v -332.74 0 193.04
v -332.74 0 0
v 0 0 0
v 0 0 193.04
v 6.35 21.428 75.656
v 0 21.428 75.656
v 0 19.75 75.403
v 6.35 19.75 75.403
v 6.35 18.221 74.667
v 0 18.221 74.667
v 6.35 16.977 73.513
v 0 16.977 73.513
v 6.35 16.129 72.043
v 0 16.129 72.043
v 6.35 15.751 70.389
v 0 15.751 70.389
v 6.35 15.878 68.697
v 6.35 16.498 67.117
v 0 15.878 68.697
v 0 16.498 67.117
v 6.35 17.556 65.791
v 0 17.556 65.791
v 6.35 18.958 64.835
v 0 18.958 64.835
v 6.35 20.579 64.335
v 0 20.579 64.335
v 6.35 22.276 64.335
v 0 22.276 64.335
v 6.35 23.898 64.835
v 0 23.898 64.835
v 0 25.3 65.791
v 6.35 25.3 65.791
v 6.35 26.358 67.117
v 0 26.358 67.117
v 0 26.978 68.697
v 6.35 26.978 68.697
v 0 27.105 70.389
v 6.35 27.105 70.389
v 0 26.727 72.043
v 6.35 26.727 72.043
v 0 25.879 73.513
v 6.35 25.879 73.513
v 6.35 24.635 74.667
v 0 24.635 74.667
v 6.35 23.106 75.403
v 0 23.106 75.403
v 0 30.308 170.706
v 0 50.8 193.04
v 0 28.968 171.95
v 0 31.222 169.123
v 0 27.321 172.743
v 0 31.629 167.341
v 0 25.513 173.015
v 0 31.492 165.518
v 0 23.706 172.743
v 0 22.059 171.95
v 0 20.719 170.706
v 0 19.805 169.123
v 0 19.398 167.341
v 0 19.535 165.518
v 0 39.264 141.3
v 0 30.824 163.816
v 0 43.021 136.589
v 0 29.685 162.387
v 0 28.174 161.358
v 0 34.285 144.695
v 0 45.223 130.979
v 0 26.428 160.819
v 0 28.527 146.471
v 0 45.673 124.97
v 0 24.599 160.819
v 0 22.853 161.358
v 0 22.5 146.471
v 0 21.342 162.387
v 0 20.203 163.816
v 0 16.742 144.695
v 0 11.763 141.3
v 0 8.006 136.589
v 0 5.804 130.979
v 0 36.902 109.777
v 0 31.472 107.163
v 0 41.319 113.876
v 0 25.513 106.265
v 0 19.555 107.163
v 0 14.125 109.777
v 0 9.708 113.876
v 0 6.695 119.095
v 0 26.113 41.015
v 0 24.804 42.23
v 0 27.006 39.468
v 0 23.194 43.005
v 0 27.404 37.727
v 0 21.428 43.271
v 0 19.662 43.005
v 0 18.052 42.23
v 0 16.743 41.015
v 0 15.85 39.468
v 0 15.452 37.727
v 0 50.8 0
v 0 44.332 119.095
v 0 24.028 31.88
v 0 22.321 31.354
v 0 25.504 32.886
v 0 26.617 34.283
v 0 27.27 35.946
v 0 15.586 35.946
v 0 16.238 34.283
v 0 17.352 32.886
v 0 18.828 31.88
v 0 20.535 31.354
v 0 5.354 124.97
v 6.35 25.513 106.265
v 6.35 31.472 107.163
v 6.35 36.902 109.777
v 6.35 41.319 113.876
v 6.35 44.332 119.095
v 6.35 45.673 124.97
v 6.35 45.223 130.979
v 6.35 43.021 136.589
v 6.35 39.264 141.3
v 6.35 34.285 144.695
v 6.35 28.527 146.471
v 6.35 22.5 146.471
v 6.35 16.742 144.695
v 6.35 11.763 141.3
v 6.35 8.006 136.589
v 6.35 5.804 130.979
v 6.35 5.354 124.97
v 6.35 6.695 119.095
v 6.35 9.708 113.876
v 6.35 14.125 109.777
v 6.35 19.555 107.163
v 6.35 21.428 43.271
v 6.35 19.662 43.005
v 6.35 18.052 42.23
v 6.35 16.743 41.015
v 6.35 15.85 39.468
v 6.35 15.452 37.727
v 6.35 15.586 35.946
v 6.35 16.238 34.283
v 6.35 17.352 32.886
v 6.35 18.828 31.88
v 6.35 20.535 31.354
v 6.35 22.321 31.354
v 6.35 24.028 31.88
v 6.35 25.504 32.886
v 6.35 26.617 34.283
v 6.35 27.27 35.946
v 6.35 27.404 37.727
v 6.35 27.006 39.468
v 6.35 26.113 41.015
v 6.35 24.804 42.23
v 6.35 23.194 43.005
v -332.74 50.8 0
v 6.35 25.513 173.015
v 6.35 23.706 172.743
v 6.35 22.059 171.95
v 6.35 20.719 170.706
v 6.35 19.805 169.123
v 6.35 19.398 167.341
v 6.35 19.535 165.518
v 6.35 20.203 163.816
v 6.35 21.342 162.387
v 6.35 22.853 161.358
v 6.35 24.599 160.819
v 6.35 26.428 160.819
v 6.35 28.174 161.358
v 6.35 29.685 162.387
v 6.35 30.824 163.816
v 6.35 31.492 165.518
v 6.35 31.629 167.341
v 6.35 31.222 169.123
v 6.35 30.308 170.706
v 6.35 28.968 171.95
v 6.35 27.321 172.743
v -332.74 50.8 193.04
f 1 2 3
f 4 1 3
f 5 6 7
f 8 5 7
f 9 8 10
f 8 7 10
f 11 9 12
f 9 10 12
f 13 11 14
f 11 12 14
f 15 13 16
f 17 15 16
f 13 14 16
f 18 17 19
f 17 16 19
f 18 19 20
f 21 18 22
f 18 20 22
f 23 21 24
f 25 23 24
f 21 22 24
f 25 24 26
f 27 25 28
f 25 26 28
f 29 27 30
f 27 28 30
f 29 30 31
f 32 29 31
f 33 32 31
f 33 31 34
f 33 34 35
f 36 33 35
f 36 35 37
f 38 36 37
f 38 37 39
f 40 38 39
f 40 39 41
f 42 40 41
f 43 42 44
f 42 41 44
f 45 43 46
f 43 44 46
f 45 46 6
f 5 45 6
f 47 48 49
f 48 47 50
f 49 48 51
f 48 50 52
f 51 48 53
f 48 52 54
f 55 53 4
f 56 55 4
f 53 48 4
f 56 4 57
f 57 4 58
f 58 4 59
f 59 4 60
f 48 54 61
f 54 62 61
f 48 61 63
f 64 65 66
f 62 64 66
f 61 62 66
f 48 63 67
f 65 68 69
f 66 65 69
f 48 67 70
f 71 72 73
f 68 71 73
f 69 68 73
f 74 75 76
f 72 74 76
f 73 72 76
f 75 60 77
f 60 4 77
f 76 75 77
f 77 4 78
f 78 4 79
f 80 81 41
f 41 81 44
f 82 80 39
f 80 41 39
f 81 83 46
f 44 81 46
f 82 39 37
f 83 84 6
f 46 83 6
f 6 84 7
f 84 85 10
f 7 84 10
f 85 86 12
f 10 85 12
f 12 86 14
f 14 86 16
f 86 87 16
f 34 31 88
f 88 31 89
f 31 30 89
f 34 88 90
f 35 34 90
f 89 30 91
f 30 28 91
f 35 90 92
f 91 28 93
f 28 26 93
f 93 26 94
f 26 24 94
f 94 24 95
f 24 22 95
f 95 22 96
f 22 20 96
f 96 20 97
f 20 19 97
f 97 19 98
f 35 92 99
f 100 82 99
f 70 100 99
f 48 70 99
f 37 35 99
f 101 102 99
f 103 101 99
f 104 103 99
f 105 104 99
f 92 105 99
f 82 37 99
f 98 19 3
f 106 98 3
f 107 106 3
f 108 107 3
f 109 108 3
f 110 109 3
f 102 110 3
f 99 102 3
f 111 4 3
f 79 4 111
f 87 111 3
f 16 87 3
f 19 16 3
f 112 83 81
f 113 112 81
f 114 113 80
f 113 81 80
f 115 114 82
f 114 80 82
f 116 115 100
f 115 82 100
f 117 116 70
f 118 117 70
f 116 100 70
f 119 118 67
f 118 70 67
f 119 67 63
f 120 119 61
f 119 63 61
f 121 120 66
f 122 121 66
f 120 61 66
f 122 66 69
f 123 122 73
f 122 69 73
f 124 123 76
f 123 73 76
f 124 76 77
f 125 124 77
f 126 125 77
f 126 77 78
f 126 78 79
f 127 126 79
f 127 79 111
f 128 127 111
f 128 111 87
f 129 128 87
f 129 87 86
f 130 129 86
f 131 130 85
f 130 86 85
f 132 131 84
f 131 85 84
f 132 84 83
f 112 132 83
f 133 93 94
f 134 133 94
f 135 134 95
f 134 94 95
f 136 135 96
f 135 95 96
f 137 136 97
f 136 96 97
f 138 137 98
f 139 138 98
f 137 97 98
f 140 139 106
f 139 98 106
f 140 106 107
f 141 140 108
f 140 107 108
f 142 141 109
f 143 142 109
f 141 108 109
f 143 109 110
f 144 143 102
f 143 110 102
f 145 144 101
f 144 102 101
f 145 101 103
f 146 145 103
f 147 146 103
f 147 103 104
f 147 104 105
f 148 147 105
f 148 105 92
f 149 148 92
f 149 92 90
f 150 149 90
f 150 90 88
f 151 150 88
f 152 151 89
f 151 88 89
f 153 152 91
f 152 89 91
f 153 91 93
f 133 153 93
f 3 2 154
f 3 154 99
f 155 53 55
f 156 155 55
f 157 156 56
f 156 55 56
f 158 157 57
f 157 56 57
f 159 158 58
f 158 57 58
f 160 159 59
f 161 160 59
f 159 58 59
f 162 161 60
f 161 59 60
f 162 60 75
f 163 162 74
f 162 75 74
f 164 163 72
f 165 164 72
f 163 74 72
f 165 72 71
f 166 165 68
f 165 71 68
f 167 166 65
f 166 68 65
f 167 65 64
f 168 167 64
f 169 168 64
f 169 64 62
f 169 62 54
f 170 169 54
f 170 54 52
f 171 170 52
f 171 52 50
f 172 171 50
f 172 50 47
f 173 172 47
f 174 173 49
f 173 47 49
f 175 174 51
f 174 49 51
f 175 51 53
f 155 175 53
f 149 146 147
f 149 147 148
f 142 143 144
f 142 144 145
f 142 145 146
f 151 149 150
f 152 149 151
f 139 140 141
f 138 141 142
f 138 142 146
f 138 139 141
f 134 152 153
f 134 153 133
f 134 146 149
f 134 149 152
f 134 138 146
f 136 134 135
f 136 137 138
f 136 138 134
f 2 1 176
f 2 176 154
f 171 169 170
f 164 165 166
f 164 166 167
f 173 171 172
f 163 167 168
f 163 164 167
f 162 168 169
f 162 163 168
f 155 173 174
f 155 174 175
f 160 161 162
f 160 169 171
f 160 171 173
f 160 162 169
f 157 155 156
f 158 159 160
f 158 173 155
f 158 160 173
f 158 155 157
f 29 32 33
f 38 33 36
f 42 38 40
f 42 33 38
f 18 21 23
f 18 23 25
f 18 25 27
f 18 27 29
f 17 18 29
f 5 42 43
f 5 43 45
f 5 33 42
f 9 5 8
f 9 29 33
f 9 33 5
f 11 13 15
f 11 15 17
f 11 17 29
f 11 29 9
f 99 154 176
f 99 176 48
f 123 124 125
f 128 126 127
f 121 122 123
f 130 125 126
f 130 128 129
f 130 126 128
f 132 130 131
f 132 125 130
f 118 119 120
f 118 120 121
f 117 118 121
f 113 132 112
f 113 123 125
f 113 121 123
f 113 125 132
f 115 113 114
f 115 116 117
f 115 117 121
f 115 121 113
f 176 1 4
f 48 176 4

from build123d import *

# Parameters (mm, degrees)
SKETCH1_W           = 332.74
SKETCH1_H           = 193.04
BOSS_EXTRUDE1_DEPTH = 50.8
SKETCH2_R           = 20.216216718
SKETCH2_R_2         = 6.132571036
SKETCH2_R_3         = 5.692545101
SKETCH2_R_4         = 5.992355172
BOSS_EXTRUDE2_DEPTH = 6.35


with BuildPart() as part:
    # Sketch1 → Boss-Extrude1 (new body)
    with BuildSketch(Plane(origin=(0, 0, 0), x_dir=(1, 0, 0), z_dir=(0, 1, 0))):
        with Locations((-166.37, -96.52)):
            Rectangle(SKETCH1_W, SKETCH1_H)
    extrude(amount=BOSS_EXTRUDE1_DEPTH)

    # Sketch2 → Boss-Extrude2 (add)
    with BuildSketch(Plane(origin=(0, 0, 0), x_dir=(0, 0, -1), z_dir=(1, 0, 0))):
        with Locations((-126.480916113, 25.513488319)):
            Circle(SKETCH2_R)
        with Locations(Location((-166.882757539, 25.513488319, 0), (0, 0, 180))):
            Circle(SKETCH2_R_2)
        with Locations(Location((-69.963733445, 21.427908849, 0), (0, 0, 180))):
            Circle(SKETCH2_R_3)
        with Locations(Location((-37.279097685, 21.427908849, 0), (0, 0, 180))):
            Circle(SKETCH2_R_4)
    extrude(amount=BOSS_EXTRUDE2_DEPTH)


solid = part.part
